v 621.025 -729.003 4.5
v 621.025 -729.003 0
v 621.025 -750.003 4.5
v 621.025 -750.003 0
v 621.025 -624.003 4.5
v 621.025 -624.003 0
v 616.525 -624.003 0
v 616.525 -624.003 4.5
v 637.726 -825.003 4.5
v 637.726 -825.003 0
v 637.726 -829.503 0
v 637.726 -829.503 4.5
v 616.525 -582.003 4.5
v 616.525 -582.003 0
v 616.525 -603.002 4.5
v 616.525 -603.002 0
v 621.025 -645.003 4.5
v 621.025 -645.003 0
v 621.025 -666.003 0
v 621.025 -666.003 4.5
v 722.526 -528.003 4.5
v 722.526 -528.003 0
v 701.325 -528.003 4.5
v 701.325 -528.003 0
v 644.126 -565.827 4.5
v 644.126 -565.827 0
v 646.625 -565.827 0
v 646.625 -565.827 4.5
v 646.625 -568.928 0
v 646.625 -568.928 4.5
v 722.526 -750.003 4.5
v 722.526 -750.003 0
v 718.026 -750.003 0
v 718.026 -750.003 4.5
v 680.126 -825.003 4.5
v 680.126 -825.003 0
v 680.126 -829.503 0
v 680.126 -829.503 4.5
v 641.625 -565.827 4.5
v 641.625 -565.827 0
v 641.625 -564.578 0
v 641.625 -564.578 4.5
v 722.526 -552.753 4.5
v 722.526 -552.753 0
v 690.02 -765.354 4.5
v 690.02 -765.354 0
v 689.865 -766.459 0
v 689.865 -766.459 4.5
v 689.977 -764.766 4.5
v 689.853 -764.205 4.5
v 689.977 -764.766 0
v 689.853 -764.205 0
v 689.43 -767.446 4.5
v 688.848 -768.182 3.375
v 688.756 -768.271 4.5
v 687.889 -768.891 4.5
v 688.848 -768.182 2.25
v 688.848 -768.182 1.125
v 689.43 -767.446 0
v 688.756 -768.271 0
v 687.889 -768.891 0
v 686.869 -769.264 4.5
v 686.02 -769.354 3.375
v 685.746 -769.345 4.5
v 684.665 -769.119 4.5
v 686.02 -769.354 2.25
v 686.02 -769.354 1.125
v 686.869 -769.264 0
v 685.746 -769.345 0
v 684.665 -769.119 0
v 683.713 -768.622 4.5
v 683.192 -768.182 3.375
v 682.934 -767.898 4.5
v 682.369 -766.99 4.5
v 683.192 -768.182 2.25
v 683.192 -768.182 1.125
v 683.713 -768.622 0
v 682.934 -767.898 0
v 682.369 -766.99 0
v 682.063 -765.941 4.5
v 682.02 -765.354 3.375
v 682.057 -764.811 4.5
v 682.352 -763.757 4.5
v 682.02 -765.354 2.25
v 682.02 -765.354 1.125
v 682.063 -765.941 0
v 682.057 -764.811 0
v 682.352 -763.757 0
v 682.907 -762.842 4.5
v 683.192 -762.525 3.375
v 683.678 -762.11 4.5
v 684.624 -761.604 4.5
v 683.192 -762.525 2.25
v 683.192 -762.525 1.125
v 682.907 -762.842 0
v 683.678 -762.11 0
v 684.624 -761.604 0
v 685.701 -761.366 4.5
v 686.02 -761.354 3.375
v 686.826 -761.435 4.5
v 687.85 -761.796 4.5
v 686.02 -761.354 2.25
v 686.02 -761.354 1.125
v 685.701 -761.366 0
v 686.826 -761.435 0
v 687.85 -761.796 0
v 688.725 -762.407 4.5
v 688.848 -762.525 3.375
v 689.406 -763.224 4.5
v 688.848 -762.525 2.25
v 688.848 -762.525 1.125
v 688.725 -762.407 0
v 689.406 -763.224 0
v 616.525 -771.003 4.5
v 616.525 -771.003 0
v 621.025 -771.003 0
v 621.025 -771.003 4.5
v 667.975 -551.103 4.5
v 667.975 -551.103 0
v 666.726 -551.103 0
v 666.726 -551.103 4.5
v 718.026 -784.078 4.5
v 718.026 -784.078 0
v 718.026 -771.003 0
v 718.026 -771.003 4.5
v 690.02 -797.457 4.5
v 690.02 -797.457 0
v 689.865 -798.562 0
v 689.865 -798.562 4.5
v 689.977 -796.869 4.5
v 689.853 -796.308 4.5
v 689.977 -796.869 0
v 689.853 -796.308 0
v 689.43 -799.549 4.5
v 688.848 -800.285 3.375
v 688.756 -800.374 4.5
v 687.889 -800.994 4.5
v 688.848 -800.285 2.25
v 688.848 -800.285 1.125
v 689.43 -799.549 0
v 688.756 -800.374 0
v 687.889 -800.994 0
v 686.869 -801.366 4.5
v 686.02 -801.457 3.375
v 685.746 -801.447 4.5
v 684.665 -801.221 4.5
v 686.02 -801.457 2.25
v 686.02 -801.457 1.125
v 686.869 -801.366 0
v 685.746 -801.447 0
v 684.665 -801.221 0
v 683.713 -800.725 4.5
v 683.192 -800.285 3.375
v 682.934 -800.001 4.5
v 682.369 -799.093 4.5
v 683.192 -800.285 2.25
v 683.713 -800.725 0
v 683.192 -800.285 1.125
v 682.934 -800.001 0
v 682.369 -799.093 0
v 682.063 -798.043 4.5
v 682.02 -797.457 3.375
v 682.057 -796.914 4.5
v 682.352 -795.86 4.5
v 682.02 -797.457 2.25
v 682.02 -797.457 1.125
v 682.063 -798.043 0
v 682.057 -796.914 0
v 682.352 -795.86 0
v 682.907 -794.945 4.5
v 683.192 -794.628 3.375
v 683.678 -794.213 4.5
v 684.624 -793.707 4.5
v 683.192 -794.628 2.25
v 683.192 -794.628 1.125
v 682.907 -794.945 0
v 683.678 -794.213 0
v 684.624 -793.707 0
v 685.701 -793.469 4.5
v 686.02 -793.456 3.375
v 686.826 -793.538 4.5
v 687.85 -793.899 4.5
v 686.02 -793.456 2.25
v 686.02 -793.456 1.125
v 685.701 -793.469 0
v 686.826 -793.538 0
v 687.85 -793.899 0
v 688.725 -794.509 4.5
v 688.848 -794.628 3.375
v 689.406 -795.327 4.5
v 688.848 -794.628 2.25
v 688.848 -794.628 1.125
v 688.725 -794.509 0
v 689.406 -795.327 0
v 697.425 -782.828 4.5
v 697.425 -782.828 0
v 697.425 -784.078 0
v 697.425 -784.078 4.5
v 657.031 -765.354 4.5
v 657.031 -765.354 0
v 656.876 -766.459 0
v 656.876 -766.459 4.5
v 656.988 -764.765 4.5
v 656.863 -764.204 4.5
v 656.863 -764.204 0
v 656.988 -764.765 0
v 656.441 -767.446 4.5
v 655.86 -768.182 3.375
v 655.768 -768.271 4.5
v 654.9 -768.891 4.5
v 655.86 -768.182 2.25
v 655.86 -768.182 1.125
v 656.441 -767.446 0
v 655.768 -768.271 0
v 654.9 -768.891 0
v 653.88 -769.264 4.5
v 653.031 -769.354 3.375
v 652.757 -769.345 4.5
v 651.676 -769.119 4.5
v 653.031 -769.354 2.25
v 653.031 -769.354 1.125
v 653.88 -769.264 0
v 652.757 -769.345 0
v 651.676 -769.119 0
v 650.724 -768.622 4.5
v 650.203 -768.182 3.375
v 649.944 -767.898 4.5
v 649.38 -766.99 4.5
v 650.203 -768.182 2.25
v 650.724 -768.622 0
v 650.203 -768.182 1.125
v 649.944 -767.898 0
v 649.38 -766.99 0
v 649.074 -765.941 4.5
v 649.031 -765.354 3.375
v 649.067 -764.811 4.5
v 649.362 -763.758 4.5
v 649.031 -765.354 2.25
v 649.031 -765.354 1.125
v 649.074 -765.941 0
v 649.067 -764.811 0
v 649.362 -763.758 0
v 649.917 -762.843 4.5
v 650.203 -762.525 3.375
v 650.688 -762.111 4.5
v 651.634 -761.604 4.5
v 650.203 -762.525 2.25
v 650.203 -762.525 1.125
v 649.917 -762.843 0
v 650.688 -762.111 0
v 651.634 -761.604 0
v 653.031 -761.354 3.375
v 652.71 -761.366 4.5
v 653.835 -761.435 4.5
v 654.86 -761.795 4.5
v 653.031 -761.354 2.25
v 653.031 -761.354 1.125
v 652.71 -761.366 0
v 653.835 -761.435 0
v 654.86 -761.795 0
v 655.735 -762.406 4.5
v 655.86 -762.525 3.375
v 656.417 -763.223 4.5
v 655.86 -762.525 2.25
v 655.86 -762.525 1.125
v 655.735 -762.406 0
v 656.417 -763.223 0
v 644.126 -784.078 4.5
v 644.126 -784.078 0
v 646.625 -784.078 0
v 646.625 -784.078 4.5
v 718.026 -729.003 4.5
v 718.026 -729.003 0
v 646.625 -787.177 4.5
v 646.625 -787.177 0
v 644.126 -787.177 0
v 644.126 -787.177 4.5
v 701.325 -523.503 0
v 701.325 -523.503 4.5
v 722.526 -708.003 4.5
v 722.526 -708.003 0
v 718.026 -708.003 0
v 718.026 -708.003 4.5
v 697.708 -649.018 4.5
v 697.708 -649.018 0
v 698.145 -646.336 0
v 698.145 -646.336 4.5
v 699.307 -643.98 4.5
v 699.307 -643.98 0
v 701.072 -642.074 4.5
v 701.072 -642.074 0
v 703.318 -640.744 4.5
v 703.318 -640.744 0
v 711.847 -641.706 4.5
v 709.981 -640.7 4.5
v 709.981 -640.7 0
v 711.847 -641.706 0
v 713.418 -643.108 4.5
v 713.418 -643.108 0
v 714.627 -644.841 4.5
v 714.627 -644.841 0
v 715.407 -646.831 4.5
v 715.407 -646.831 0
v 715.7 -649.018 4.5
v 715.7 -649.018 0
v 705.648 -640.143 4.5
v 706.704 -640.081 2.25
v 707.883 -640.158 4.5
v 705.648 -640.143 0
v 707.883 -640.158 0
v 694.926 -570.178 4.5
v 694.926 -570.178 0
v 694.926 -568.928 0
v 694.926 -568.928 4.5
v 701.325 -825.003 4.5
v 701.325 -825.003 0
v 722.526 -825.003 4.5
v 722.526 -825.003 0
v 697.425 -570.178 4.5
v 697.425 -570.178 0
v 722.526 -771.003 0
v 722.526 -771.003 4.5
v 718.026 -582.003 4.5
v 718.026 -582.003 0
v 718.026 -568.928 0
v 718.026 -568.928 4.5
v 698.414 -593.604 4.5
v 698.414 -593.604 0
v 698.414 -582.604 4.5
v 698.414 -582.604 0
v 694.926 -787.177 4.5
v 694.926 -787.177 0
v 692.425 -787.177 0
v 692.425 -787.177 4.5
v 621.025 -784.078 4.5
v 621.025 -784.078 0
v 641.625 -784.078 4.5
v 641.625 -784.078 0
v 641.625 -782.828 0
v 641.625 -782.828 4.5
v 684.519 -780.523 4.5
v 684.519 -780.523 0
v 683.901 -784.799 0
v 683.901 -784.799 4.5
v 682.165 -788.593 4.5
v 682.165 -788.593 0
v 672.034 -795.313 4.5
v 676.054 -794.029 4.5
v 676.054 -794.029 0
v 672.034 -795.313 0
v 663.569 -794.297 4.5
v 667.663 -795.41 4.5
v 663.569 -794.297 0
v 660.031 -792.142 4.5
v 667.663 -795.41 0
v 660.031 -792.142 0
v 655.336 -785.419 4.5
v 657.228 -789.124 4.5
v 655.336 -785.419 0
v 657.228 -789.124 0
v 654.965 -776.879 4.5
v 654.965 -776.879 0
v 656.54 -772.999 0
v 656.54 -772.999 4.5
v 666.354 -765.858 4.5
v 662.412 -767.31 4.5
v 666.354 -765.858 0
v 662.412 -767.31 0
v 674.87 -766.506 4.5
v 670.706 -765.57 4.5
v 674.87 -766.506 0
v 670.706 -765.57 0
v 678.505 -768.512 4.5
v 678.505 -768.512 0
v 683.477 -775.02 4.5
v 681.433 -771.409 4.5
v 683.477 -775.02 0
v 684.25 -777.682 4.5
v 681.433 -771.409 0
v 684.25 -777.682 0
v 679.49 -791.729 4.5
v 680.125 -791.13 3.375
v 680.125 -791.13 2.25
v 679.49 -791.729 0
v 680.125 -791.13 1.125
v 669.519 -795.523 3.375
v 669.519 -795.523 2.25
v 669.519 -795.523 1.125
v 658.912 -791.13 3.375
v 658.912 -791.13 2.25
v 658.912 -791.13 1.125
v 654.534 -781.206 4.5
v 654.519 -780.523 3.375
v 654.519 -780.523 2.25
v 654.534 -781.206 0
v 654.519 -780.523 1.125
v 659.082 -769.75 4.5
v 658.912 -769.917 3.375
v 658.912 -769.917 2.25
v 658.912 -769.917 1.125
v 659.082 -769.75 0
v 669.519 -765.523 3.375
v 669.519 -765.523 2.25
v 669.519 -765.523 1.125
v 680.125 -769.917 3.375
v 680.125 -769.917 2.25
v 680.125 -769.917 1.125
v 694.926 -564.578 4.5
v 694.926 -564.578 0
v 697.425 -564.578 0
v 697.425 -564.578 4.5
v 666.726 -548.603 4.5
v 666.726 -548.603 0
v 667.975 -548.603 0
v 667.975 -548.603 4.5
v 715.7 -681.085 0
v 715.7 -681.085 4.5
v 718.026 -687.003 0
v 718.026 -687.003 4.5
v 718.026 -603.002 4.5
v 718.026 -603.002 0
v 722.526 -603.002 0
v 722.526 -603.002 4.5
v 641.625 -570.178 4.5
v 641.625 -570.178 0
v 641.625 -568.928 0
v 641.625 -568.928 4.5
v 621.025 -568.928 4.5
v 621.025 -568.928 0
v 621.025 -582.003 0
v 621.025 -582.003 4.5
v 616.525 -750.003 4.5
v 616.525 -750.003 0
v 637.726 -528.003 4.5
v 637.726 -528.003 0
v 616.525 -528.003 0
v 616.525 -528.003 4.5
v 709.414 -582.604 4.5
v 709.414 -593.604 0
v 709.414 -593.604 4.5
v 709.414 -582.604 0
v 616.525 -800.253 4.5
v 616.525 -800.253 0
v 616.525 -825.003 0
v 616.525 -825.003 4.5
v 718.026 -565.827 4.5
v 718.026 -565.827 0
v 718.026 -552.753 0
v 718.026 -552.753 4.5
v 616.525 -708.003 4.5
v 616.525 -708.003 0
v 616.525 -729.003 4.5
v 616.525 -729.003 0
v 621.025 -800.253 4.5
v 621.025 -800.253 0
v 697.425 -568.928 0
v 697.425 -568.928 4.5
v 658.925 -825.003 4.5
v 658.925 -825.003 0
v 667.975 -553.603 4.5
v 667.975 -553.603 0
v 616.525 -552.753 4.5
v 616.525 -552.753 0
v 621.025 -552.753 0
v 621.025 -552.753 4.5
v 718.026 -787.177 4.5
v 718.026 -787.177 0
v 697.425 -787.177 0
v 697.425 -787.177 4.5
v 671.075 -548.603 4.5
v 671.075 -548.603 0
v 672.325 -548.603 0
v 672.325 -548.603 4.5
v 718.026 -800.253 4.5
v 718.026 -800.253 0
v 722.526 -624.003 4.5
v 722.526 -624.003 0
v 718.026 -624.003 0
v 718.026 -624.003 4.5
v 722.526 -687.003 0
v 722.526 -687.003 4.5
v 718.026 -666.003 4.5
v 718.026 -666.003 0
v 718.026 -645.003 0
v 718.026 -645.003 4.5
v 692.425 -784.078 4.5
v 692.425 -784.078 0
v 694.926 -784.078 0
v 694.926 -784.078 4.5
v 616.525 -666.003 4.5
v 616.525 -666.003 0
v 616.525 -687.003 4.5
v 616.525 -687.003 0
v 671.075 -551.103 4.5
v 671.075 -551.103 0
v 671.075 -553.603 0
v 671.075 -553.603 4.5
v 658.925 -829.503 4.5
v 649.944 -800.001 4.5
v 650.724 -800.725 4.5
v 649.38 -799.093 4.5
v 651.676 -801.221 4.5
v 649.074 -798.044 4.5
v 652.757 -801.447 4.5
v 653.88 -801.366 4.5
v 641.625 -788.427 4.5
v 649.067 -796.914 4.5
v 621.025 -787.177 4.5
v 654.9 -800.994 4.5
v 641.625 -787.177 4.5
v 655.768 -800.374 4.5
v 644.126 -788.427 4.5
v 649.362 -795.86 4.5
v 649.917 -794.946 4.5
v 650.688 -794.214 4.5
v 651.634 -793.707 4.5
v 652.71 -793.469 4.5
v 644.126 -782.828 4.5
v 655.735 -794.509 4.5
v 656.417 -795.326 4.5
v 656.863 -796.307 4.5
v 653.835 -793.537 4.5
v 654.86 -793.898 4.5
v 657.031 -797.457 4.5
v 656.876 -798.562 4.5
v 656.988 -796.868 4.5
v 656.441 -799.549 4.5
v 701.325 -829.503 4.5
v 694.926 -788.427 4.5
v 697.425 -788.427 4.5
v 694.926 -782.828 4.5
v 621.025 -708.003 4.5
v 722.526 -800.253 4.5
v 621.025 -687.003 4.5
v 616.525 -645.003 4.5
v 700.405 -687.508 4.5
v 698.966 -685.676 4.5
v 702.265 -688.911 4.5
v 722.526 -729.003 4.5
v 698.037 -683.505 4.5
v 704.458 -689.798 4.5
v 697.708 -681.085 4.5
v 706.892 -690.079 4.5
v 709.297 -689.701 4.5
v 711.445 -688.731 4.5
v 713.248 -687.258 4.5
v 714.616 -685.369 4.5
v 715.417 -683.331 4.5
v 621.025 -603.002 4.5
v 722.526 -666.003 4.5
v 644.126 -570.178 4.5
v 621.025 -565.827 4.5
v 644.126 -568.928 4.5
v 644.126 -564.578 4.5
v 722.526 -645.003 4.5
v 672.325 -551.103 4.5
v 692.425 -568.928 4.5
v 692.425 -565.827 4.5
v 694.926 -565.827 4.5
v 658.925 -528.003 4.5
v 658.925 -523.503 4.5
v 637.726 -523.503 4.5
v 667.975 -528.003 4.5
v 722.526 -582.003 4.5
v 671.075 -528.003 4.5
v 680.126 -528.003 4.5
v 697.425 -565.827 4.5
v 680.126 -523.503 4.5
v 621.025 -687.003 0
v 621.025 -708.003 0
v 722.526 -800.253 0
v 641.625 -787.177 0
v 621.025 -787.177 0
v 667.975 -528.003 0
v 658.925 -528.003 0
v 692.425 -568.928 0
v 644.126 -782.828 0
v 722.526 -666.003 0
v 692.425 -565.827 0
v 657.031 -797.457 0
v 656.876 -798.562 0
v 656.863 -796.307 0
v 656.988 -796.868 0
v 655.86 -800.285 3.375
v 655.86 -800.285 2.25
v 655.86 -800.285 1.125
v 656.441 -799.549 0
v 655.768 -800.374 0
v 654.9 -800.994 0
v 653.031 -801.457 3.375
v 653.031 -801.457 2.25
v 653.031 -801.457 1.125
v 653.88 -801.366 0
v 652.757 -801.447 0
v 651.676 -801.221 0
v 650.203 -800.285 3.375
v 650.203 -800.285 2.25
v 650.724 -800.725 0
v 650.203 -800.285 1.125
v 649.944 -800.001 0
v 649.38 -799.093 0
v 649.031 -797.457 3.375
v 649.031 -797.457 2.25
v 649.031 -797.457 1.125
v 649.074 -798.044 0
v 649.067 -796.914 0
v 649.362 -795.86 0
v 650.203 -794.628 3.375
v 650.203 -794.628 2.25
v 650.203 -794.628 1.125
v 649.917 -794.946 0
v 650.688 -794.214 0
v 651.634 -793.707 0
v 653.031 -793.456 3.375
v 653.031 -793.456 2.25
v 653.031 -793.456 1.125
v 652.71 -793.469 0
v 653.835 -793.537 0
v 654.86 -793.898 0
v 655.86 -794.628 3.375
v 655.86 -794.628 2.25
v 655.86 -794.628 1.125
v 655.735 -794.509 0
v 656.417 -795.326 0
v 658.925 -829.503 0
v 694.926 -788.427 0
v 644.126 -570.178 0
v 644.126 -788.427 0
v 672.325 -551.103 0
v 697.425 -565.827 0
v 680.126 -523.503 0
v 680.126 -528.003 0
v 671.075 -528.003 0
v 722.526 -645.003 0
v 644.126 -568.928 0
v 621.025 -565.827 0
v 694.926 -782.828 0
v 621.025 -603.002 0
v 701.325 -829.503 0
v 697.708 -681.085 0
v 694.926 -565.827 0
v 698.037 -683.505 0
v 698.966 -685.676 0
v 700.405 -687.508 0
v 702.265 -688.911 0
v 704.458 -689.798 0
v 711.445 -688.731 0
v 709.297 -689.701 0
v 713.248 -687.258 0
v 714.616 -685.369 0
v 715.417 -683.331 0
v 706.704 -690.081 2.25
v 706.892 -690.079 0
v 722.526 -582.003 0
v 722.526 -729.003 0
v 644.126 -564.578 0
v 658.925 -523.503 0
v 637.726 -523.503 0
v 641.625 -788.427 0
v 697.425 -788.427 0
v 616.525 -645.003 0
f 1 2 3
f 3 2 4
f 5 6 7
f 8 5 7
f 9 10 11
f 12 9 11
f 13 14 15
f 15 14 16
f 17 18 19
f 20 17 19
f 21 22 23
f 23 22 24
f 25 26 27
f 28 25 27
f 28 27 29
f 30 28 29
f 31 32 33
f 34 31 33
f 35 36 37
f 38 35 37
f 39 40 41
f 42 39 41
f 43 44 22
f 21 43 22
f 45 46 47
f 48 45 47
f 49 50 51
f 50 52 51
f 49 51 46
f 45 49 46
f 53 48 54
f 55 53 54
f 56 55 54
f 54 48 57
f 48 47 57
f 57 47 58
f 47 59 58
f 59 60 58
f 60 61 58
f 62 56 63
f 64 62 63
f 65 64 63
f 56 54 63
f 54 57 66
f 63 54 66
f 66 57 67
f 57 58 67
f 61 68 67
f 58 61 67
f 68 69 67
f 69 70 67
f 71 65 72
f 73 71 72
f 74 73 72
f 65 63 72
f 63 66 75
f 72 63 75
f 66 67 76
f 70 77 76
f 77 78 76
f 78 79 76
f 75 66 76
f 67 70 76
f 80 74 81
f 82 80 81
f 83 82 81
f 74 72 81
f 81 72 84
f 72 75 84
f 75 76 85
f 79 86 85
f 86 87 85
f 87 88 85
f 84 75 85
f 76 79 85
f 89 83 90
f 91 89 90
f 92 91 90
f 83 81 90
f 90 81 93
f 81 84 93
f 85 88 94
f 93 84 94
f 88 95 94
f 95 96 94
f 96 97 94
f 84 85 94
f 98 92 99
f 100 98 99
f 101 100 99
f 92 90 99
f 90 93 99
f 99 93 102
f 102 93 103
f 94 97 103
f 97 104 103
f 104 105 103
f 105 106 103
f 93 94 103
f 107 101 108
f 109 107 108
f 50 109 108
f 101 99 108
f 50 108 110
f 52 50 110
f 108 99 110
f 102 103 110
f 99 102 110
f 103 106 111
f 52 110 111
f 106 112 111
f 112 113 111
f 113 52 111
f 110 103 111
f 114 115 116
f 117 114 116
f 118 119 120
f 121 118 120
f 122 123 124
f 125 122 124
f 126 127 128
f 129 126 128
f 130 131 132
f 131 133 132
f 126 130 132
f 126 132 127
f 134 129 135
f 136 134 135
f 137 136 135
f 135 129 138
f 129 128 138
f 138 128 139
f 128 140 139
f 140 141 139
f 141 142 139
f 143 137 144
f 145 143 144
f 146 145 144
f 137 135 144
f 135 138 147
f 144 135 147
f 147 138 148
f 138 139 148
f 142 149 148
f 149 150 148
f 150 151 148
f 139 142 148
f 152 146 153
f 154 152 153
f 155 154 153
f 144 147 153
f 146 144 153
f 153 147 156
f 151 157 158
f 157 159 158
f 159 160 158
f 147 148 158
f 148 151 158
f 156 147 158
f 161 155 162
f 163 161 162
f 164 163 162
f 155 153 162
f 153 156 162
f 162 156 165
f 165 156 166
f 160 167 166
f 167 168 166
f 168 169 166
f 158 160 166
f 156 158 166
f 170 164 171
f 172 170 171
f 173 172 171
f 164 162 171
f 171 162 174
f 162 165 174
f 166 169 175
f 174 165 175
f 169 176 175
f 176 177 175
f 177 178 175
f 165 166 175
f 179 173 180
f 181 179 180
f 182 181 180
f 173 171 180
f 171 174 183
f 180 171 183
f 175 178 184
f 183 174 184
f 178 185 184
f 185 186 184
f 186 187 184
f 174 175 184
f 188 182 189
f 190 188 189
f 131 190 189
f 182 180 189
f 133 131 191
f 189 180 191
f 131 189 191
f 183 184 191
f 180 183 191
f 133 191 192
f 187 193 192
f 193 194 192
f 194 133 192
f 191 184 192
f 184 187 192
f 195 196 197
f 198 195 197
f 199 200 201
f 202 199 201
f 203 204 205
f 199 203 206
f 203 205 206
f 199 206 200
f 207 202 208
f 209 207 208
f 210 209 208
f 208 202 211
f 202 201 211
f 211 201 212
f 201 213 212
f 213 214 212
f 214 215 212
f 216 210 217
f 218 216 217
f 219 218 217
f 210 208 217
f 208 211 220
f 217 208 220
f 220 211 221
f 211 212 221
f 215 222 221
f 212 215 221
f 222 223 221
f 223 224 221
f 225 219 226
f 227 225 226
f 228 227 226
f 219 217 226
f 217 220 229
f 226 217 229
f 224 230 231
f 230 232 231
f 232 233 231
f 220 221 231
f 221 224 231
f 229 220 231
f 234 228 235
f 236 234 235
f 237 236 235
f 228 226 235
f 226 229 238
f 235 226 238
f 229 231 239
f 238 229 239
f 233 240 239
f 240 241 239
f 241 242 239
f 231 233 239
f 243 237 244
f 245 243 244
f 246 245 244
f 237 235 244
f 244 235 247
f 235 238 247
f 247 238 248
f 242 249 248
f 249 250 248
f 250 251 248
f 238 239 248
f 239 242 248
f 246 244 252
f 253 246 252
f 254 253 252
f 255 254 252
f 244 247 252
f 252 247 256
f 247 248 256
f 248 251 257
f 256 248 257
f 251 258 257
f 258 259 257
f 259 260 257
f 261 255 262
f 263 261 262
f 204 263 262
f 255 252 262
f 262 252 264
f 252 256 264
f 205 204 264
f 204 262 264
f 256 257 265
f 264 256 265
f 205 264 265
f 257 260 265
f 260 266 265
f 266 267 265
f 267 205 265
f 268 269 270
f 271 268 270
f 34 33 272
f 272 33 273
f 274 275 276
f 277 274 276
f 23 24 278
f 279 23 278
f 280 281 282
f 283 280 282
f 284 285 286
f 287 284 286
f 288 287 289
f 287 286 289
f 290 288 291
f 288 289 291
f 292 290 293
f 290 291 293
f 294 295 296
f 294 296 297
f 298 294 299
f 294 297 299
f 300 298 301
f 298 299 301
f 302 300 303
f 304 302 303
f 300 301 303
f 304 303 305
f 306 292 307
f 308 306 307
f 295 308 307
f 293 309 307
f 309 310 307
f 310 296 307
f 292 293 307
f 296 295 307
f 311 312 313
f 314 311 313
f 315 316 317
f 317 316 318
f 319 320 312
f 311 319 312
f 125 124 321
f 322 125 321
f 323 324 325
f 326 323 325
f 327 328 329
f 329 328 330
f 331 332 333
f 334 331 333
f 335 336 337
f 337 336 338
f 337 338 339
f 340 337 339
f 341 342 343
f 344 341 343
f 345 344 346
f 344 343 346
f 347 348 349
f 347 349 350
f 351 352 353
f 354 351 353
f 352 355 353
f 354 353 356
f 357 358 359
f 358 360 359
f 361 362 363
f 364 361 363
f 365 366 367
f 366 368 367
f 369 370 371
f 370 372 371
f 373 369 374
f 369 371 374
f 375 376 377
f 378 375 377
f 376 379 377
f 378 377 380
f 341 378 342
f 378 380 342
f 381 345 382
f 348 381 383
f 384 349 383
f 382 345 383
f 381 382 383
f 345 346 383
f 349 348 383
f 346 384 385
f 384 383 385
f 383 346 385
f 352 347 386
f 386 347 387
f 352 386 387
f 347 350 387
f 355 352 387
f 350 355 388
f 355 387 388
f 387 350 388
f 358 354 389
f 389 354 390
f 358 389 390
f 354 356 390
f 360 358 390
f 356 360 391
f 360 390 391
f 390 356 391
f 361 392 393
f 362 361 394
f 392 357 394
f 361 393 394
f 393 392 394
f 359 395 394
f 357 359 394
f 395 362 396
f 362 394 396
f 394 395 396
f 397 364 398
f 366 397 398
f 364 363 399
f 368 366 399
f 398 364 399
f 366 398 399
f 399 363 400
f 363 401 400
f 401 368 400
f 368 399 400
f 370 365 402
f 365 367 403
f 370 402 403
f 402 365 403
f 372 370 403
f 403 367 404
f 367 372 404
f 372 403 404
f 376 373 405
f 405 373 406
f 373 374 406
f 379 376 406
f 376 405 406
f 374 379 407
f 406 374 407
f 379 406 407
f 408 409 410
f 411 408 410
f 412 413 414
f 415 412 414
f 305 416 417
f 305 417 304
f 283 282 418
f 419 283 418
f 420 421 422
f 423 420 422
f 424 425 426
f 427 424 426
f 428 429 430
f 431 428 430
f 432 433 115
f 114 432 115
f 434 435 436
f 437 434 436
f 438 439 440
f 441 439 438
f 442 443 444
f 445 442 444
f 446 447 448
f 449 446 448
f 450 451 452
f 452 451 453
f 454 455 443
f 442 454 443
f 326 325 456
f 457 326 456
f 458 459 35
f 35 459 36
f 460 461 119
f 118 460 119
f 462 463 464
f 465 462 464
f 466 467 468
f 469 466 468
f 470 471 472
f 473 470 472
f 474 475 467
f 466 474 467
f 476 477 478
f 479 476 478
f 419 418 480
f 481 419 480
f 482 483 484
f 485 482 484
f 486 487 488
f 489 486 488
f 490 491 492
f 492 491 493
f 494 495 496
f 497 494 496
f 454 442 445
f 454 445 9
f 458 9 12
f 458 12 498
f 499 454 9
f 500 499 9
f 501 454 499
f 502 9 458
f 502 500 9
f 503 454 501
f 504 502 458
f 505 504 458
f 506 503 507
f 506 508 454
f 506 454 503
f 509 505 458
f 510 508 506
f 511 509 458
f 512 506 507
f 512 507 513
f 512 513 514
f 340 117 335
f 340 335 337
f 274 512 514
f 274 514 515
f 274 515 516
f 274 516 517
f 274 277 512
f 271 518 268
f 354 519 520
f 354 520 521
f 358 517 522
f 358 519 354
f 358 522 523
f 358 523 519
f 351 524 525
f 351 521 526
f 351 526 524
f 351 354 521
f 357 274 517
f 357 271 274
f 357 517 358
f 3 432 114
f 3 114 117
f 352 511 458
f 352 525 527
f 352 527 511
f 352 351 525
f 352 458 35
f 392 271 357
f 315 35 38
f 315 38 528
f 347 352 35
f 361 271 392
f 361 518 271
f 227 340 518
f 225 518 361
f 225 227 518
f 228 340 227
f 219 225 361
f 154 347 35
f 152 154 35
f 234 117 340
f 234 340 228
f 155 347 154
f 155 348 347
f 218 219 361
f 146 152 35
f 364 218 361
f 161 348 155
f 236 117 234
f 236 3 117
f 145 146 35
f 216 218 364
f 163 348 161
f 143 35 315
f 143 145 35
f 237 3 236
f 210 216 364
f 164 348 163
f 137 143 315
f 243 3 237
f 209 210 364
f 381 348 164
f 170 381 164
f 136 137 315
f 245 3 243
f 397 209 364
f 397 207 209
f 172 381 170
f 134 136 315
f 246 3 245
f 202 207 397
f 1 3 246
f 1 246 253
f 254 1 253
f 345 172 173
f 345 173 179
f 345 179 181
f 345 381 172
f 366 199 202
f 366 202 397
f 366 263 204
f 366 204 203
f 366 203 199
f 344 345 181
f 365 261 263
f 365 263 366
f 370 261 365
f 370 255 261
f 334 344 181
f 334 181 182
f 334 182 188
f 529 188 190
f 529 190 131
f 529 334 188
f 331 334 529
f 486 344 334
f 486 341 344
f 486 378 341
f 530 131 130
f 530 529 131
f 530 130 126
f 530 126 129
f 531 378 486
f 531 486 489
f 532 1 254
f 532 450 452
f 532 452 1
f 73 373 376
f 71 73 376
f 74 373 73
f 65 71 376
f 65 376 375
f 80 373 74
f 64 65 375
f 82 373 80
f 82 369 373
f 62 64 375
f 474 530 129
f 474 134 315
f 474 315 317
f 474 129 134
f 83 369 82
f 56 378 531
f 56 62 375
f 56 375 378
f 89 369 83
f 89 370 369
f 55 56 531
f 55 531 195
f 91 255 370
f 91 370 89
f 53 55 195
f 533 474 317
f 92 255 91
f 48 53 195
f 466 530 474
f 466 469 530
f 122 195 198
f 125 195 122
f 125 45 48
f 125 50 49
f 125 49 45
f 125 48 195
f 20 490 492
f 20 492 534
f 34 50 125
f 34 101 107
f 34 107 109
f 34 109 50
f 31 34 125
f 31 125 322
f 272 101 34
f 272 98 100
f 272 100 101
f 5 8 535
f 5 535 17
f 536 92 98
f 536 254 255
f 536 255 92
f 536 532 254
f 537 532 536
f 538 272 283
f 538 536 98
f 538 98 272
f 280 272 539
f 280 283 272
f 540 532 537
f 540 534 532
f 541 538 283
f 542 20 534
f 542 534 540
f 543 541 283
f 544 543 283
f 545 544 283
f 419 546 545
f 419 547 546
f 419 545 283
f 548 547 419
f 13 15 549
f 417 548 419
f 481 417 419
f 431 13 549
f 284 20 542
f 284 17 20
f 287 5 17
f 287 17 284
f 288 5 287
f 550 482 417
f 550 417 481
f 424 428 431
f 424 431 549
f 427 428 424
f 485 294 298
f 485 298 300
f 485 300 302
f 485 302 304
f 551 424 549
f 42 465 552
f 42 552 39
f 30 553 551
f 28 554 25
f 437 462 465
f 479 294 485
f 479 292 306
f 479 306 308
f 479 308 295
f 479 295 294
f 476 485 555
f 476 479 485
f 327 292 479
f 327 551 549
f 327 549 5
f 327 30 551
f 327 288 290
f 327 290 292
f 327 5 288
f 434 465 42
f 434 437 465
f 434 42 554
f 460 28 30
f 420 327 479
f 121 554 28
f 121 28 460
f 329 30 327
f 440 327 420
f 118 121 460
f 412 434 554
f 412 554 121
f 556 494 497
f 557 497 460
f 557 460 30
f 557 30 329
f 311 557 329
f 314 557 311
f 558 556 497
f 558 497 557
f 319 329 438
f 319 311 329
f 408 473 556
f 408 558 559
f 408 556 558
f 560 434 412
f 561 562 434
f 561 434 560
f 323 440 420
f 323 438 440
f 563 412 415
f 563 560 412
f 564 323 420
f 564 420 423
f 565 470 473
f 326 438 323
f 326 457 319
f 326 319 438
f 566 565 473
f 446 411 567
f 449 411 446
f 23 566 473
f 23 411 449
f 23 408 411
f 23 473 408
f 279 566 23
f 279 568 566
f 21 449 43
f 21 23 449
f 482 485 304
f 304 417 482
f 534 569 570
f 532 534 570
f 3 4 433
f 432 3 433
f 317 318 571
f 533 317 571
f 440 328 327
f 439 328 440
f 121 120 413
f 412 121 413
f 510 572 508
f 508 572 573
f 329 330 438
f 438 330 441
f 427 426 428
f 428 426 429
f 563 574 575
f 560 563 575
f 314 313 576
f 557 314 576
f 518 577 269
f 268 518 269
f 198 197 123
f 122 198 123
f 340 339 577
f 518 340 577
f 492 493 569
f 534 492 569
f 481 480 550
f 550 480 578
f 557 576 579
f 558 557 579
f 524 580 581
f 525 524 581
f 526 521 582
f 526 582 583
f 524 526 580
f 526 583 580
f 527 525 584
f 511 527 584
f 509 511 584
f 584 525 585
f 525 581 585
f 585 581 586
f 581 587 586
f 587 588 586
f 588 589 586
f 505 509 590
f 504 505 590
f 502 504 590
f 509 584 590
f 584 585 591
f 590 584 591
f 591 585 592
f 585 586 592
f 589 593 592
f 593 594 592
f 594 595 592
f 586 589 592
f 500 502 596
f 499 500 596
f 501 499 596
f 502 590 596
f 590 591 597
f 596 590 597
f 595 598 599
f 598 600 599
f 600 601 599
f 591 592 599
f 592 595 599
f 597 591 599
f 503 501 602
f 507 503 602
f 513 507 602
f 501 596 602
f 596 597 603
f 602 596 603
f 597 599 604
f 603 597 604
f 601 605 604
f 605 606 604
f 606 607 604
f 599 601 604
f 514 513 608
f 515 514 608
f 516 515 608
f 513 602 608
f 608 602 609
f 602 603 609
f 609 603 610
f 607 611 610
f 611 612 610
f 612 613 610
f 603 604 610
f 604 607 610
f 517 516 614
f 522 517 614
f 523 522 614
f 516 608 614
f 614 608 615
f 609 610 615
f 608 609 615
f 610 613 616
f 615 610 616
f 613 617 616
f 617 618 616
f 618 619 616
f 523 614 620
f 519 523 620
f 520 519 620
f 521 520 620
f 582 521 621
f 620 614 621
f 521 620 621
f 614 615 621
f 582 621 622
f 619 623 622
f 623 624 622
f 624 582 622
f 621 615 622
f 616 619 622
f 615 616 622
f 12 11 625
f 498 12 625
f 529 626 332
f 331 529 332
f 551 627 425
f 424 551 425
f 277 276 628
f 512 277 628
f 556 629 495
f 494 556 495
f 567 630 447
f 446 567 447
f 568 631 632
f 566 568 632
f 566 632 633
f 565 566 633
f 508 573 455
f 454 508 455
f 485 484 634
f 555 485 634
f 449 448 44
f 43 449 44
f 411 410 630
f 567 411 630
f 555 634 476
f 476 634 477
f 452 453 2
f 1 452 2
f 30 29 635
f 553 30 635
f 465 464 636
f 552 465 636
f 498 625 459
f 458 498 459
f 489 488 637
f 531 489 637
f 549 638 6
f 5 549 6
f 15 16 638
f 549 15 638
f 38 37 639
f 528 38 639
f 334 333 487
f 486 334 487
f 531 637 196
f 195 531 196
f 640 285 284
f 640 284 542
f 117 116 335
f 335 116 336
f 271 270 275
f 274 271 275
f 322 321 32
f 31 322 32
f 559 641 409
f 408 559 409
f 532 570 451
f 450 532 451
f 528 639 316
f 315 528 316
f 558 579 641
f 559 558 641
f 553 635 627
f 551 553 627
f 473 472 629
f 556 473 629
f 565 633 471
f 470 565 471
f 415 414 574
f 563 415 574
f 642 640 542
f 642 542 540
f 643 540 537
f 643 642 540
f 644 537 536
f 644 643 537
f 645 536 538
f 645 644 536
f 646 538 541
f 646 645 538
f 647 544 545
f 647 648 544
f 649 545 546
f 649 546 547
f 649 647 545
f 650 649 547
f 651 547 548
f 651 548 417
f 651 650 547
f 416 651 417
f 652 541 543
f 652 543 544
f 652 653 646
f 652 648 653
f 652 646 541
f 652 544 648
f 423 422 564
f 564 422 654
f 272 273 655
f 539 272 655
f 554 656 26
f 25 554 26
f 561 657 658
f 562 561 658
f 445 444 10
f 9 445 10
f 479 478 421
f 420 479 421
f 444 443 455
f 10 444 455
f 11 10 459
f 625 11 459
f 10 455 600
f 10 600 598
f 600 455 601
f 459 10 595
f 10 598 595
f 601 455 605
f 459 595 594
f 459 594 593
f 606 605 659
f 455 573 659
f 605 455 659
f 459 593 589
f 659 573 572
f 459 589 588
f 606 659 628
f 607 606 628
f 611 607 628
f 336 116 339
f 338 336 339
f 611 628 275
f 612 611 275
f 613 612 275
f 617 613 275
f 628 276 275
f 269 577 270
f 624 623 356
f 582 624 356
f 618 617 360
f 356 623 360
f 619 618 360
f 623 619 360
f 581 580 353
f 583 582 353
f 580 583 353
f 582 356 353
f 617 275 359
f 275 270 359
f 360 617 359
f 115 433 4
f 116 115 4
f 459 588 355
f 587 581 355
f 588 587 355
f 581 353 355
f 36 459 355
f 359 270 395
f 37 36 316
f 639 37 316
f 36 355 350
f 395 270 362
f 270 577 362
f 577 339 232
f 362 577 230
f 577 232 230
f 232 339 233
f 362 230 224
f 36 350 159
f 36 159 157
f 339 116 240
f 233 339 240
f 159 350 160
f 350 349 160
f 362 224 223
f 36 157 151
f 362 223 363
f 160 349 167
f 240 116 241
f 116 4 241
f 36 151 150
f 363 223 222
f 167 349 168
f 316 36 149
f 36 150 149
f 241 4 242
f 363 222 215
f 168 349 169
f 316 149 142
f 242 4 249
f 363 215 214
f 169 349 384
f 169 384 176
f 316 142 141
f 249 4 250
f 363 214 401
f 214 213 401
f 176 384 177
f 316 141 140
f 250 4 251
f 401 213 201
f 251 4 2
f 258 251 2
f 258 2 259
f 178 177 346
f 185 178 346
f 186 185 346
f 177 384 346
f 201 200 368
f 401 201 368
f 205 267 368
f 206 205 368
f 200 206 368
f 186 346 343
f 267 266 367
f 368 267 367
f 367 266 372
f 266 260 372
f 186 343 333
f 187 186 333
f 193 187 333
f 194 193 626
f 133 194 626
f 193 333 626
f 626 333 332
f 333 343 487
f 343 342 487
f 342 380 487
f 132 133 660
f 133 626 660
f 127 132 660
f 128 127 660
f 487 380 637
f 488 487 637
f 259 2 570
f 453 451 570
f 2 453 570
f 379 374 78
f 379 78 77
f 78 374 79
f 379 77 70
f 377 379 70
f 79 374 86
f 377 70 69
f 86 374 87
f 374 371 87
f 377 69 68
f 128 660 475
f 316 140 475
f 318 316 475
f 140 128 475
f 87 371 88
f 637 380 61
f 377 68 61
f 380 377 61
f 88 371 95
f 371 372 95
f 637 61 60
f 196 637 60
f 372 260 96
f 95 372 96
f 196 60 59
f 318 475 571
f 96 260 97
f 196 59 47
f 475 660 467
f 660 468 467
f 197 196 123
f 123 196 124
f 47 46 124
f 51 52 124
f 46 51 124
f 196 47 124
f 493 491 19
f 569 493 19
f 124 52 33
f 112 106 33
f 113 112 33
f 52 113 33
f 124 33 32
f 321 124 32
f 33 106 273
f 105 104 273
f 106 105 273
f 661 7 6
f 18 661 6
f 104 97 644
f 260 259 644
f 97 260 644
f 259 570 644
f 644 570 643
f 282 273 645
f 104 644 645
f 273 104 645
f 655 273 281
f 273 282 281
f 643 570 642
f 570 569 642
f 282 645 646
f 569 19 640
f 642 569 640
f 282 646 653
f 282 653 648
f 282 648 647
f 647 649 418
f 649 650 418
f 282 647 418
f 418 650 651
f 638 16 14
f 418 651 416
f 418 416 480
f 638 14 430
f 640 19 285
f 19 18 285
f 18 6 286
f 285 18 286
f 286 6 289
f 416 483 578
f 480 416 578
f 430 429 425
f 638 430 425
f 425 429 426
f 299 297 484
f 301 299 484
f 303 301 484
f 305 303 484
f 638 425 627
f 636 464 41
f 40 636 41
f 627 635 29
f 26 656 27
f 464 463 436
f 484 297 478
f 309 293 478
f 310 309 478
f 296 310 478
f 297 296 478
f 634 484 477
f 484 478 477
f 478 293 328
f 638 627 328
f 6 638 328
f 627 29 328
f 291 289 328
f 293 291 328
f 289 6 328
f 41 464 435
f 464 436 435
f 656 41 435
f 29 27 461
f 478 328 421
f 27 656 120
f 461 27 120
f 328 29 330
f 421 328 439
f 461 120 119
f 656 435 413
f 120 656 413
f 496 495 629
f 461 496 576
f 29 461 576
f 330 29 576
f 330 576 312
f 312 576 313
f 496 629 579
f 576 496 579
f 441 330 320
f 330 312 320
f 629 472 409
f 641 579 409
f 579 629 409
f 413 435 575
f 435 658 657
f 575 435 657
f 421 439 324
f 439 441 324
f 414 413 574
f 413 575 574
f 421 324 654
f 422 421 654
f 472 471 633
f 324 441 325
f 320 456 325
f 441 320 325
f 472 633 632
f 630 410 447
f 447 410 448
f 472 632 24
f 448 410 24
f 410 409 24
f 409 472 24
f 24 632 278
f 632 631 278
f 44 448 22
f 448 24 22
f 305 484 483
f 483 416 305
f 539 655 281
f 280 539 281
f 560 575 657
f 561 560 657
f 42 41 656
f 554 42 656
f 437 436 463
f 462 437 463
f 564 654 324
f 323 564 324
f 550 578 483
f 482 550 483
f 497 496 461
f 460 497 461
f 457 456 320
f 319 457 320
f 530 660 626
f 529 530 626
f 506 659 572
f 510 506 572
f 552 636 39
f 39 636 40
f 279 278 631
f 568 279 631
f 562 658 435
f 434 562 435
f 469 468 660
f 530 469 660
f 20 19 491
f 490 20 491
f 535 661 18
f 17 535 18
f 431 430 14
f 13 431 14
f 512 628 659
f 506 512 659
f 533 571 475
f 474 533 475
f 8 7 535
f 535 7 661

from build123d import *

# Parameters (mm, degrees)
MODEL_W             = 11.000175553
MODEL_H             = 10.999999163
BOSS_EXTRUDE1_DEPTH = 4.5


with BuildPart() as part:
    # Model → Boss-Extrude1 (new body)
    with BuildSketch(Plane.XY):
        Polygon((718.025755932, -565.527754303), (718.025755932, -552.752647917), (722.525753986, -552.752647917), (722.525718708, -528.002746812), (701.325291214, -528.002746812), (701.325291214, -523.502748758), (680.125569274, -523.502748758), (680.125569274, -528.002746812), (671.075302332, -528.002746812), (671.075302332, -548.602675974), (672.325193999, -548.602675974), (672.325193999, -551.102812084), (671.075302332, -551.102812084), (671.075302332, -553.602560139), (667.975408722, -553.602560139), (667.975408722, -551.102812084), (666.725517056, -551.102812084), (666.725517056, -548.602675974), (667.975408722, -548.602675974), (667.975408722, -528.002746812), (658.92514178, -528.002746812), (658.92514178, -523.502748758), (637.725560952, -523.502748758), (637.725560952, -528.002746812), (616.525486235, -528.002746812), (616.525486235, -552.752647917), (621.025449011, -552.752647917), (621.025449011, -565.827474303), (641.625413451, -565.827474303), (641.625413451, -564.577582637), (644.125514283, -564.577582637), (644.125514283, -565.827474303), (646.625438727, -565.827474303), (646.625438727, -568.927720691), (644.125514283, -568.927720691), (644.125514283, -570.177612357), (641.625413451, -570.177612357), (641.625413451, -568.927720691), (621.025449011, -568.927720691), (621.025449011, -582.002547077), (616.525486235, -582.002547077), (616.525486235, -603.002455683), (621.025449011, -603.002455683), (621.025449011, -624.002752344), (616.525486235, -624.002752344), (616.525486235, -645.00266095), (621.025449011, -645.00266095), (621.025449011, -666.002569556), (616.525486235, -666.002569556), (616.525486235, -687.002513439), (621.025449011, -687.002513439), (621.025449011, -708.002774823), (616.525486235, -708.002774823), (616.525486235, -729.002859818), (621.025449011, -729.002859818), (621.025449011, -750.002803701), (616.525486235, -750.002803701), (616.525486235, -771.002712307), (621.025449011, -771.002712307), (621.025449011, -784.077538693), (641.625413451, -784.077538693), (641.625413451, -782.827682304), (644.125514283, -782.827682304), (644.125514283, -784.077538693), (646.625438727, -784.077538693), (646.625438727, -787.177432303), (644.125514283, -787.177432303), (644.125514283, -788.42732397), (641.625413451, -788.42732397), (641.625413451, -787.177432303), (621.025449011, -787.177432303), (621.025449011, -800.252964244), (616.525486235, -800.252964244), (616.525486235, -825.002512572), (637.725560952, -825.002512572), (637.725560952, -829.502510626), (658.92514178, -829.502510626), (658.92514178, -825.002512572), (667.975408722, -825.002512572), (671.075302332, -825.002512572), (680.125569274, -825.002512572), (680.125569274, -829.502510626), (701.325291214, -829.502510626), (701.325291214, -825.002512572), (722.525718708, -825.002512572), (722.525753986, -800.252787855), (718.025755932, -800.252787855), (718.025755932, -787.47768147), (718.025755932, -787.177432303), (697.425438715, -787.177432303), (697.425438715, -788.42732397), (694.92569066, -788.42732397), (694.92569066, -787.177432303), (692.425237049, -787.177432303), (692.425237049, -784.077538693), (694.92569066, -784.077538693), (694.92569066, -782.827682304), (697.425438715, -782.827682304), (697.425438715, -784.077538693), (718.025755932, -784.077538693), (718.025755932, -783.777642304), (718.025755932, -771.002535918), (722.525753986, -771.002535918), (722.525753986, -750.002627312), (718.025755932, -750.002627312), (718.025755932, -729.002718707), (722.525753986, -729.002718707), (722.525753986, -708.002774823), (718.025755932, -708.002774823), (718.025755932, -687.002513439), (722.525753986, -687.002513439), (722.525753986, -666.002569556), (718.025755932, -666.002569556), (718.025755932, -645.00266095), (722.525753986, -645.00266095), (722.525753986, -624.002752344), (718.025755932, -624.002752344), (718.025755932, -603.002455683), (722.525753986, -603.002455683), (722.525753986, -582.002547077), (718.025755932, -582.002547077), (718.025755932, -569.227793469), (718.025755932, -568.927720691), (697.425438715, -568.927720691), (697.425438715, -570.177612357), (694.92569066, -570.177612357), (694.92569066, -568.927720691), (692.425237049, -568.927720691), (692.425237049, -565.827474303), (694.92569066, -565.827474303), (694.92569066, -564.577582637), (697.425438715, -564.577582637), (697.425438715, -565.827474303), (718.025755932, -565.827474303), align=None)
        with BuildLine():
            Line((715.699609821, -681.085054274), (715.699609821, -649.017765949))
            add(Edge.make_bspline(
                [(697.707943159, -649.017765949), (697.767209826, -644.081946228), (701.768344825, -640.080811229), (706.70377649, -640.080811229), (711.639913711, -640.080811229), (715.64104871, -644.081946228), (715.699609821, -649.017765949)],
                knots=[0, 0, 0, 0, 1, 1, 1, 2, 2, 2, 2], degree=3))
            Line((697.707943159, -649.017765949), (697.707943159, -681.085054274))
            add(Edge.make_bspline(
                [(697.707943159, -681.085054274), (697.707943159, -686.053223717), (701.735959825, -690.080887605), (706.70377649, -690.080887605), (711.672298711, -690.080887605), (715.699609821, -686.053223717), (715.699609821, -681.085054274)],
                knots=[0, 0, 0, 0, 1, 1, 1, 2, 2, 2, 2], degree=3))
        make_face(mode=Mode.SUBTRACT)
        with Locations((703.913939269, -588.103891659)):
            Rectangle(MODEL_W, MODEL_H, mode=Mode.SUBTRACT)
        with BuildLine():
            add(Edge.make_bspline(
                [(654.518841503, -780.523232027), (654.518841503, -772.238810362), (661.234389835, -765.523297309), (669.518811499, -765.523297309), (677.803233164, -765.523297309), (684.518746218, -772.238810362), (684.518746218, -780.523232027)],
                knots=[2, 2, 2, 2, 3, 3, 3, 4, 4, 4, 4], degree=3))
            add(Edge.make_bspline(
                [(684.518746218, -780.523232027), (684.518746218, -788.807653692), (677.803233164, -795.523202023), (669.518811499, -795.523202023), (661.234389835, -795.523202023), (654.518841503, -788.807653692), (654.518841503, -780.523232027)],
                knots=[0, 0, 0, 0, 1, 1, 1, 2, 2, 2, 2], degree=3))
        make_face(mode=Mode.SUBTRACT)
        with BuildLine():
            add(Edge.make_bspline(
                [(682.020373996, -797.456565356), (682.020373996, -795.247223968), (683.811109273, -793.456488691), (686.020133162, -793.456488691), (688.229121772, -793.456488691), (690.019892327, -795.247223968), (690.019892327, -797.456565356)],
                knots=[2, 2, 2, 2, 3, 3, 3, 4, 4, 4, 4], degree=3))
            add(Edge.make_bspline(
                [(690.019892327, -797.456565356), (690.019892327, -799.665589245), (688.229121772, -801.4566773), (686.020133162, -801.4566773), (683.811109273, -801.4566773), (682.020373996, -799.665589245), (682.020373996, -797.456565356)],
                knots=[0, 0, 0, 0, 1, 1, 1, 2, 2, 2, 2], degree=3))
        make_face(mode=Mode.SUBTRACT)
        with BuildLine():
            add(Edge.make_bspline(
                [(682.020373996, -765.353787586), (682.020373996, -763.144446198), (683.811109273, -761.353710921), (686.020133162, -761.353710921), (688.229121772, -761.353710921), (690.019892327, -763.144446198), (690.019892327, -765.353787586)],
                knots=[2, 2, 2, 2, 3, 3, 3, 4, 4, 4, 4], degree=3))
            add(Edge.make_bspline(
                [(690.019892327, -765.353787586), (690.019892327, -767.562811475), (688.229121772, -769.35389953), (686.020133162, -769.35389953), (683.811109273, -769.35389953), (682.020373996, -767.562811475), (682.020373996, -765.353787586)],
                knots=[0, 0, 0, 0, 1, 1, 1, 2, 2, 2, 2], degree=3))
        make_face(mode=Mode.SUBTRACT)
        with BuildLine():
            add(Edge.make_bspline(
                [(649.030818727, -765.353787586), (649.030818727, -763.144446198), (650.82194206, -761.353710921), (653.03124817, -761.353710921), (655.240272058, -761.353710921), (657.031007336, -763.144446198), (657.031007336, -765.353787586)],
                knots=[2, 2, 2, 2, 3, 3, 3, 4, 4, 4, 4], degree=3))
            add(Edge.make_bspline(
                [(657.031007336, -765.353787586), (657.031007336, -767.562811475), (655.240272058, -769.35389953), (653.03124817, -769.35389953), (650.82194206, -769.35389953), (649.030818727, -767.562811475), (649.030818727, -765.353787586)],
                knots=[0, 0, 0, 0, 1, 1, 1, 2, 2, 2, 2], degree=3))
        make_face(mode=Mode.SUBTRACT)
        with BuildLine():
            add(Edge.make_bspline(
                [(649.030818727, -797.456565356), (649.030818727, -795.247223968), (650.82194206, -793.456488691), (653.03124817, -793.456488691), (655.240272058, -793.456488691), (657.031007336, -795.247223968), (657.031007336, -797.456565356)],
                knots=[2, 2, 2, 2, 3, 3, 3, 4, 4, 4, 4], degree=3))
            add(Edge.make_bspline(
                [(657.031007336, -797.456565356), (657.031007336, -799.665589245), (655.240272058, -801.4566773), (653.03124817, -801.4566773), (650.82194206, -801.4566773), (649.030818727, -799.665589245), (649.030818727, -797.456565356)],
                knots=[0, 0, 0, 0, 1, 1, 1, 2, 2, 2, 2], degree=3))
        make_face(mode=Mode.SUBTRACT)
    extrude(amount=BOSS_EXTRUDE1_DEPTH)


solid = part.part
